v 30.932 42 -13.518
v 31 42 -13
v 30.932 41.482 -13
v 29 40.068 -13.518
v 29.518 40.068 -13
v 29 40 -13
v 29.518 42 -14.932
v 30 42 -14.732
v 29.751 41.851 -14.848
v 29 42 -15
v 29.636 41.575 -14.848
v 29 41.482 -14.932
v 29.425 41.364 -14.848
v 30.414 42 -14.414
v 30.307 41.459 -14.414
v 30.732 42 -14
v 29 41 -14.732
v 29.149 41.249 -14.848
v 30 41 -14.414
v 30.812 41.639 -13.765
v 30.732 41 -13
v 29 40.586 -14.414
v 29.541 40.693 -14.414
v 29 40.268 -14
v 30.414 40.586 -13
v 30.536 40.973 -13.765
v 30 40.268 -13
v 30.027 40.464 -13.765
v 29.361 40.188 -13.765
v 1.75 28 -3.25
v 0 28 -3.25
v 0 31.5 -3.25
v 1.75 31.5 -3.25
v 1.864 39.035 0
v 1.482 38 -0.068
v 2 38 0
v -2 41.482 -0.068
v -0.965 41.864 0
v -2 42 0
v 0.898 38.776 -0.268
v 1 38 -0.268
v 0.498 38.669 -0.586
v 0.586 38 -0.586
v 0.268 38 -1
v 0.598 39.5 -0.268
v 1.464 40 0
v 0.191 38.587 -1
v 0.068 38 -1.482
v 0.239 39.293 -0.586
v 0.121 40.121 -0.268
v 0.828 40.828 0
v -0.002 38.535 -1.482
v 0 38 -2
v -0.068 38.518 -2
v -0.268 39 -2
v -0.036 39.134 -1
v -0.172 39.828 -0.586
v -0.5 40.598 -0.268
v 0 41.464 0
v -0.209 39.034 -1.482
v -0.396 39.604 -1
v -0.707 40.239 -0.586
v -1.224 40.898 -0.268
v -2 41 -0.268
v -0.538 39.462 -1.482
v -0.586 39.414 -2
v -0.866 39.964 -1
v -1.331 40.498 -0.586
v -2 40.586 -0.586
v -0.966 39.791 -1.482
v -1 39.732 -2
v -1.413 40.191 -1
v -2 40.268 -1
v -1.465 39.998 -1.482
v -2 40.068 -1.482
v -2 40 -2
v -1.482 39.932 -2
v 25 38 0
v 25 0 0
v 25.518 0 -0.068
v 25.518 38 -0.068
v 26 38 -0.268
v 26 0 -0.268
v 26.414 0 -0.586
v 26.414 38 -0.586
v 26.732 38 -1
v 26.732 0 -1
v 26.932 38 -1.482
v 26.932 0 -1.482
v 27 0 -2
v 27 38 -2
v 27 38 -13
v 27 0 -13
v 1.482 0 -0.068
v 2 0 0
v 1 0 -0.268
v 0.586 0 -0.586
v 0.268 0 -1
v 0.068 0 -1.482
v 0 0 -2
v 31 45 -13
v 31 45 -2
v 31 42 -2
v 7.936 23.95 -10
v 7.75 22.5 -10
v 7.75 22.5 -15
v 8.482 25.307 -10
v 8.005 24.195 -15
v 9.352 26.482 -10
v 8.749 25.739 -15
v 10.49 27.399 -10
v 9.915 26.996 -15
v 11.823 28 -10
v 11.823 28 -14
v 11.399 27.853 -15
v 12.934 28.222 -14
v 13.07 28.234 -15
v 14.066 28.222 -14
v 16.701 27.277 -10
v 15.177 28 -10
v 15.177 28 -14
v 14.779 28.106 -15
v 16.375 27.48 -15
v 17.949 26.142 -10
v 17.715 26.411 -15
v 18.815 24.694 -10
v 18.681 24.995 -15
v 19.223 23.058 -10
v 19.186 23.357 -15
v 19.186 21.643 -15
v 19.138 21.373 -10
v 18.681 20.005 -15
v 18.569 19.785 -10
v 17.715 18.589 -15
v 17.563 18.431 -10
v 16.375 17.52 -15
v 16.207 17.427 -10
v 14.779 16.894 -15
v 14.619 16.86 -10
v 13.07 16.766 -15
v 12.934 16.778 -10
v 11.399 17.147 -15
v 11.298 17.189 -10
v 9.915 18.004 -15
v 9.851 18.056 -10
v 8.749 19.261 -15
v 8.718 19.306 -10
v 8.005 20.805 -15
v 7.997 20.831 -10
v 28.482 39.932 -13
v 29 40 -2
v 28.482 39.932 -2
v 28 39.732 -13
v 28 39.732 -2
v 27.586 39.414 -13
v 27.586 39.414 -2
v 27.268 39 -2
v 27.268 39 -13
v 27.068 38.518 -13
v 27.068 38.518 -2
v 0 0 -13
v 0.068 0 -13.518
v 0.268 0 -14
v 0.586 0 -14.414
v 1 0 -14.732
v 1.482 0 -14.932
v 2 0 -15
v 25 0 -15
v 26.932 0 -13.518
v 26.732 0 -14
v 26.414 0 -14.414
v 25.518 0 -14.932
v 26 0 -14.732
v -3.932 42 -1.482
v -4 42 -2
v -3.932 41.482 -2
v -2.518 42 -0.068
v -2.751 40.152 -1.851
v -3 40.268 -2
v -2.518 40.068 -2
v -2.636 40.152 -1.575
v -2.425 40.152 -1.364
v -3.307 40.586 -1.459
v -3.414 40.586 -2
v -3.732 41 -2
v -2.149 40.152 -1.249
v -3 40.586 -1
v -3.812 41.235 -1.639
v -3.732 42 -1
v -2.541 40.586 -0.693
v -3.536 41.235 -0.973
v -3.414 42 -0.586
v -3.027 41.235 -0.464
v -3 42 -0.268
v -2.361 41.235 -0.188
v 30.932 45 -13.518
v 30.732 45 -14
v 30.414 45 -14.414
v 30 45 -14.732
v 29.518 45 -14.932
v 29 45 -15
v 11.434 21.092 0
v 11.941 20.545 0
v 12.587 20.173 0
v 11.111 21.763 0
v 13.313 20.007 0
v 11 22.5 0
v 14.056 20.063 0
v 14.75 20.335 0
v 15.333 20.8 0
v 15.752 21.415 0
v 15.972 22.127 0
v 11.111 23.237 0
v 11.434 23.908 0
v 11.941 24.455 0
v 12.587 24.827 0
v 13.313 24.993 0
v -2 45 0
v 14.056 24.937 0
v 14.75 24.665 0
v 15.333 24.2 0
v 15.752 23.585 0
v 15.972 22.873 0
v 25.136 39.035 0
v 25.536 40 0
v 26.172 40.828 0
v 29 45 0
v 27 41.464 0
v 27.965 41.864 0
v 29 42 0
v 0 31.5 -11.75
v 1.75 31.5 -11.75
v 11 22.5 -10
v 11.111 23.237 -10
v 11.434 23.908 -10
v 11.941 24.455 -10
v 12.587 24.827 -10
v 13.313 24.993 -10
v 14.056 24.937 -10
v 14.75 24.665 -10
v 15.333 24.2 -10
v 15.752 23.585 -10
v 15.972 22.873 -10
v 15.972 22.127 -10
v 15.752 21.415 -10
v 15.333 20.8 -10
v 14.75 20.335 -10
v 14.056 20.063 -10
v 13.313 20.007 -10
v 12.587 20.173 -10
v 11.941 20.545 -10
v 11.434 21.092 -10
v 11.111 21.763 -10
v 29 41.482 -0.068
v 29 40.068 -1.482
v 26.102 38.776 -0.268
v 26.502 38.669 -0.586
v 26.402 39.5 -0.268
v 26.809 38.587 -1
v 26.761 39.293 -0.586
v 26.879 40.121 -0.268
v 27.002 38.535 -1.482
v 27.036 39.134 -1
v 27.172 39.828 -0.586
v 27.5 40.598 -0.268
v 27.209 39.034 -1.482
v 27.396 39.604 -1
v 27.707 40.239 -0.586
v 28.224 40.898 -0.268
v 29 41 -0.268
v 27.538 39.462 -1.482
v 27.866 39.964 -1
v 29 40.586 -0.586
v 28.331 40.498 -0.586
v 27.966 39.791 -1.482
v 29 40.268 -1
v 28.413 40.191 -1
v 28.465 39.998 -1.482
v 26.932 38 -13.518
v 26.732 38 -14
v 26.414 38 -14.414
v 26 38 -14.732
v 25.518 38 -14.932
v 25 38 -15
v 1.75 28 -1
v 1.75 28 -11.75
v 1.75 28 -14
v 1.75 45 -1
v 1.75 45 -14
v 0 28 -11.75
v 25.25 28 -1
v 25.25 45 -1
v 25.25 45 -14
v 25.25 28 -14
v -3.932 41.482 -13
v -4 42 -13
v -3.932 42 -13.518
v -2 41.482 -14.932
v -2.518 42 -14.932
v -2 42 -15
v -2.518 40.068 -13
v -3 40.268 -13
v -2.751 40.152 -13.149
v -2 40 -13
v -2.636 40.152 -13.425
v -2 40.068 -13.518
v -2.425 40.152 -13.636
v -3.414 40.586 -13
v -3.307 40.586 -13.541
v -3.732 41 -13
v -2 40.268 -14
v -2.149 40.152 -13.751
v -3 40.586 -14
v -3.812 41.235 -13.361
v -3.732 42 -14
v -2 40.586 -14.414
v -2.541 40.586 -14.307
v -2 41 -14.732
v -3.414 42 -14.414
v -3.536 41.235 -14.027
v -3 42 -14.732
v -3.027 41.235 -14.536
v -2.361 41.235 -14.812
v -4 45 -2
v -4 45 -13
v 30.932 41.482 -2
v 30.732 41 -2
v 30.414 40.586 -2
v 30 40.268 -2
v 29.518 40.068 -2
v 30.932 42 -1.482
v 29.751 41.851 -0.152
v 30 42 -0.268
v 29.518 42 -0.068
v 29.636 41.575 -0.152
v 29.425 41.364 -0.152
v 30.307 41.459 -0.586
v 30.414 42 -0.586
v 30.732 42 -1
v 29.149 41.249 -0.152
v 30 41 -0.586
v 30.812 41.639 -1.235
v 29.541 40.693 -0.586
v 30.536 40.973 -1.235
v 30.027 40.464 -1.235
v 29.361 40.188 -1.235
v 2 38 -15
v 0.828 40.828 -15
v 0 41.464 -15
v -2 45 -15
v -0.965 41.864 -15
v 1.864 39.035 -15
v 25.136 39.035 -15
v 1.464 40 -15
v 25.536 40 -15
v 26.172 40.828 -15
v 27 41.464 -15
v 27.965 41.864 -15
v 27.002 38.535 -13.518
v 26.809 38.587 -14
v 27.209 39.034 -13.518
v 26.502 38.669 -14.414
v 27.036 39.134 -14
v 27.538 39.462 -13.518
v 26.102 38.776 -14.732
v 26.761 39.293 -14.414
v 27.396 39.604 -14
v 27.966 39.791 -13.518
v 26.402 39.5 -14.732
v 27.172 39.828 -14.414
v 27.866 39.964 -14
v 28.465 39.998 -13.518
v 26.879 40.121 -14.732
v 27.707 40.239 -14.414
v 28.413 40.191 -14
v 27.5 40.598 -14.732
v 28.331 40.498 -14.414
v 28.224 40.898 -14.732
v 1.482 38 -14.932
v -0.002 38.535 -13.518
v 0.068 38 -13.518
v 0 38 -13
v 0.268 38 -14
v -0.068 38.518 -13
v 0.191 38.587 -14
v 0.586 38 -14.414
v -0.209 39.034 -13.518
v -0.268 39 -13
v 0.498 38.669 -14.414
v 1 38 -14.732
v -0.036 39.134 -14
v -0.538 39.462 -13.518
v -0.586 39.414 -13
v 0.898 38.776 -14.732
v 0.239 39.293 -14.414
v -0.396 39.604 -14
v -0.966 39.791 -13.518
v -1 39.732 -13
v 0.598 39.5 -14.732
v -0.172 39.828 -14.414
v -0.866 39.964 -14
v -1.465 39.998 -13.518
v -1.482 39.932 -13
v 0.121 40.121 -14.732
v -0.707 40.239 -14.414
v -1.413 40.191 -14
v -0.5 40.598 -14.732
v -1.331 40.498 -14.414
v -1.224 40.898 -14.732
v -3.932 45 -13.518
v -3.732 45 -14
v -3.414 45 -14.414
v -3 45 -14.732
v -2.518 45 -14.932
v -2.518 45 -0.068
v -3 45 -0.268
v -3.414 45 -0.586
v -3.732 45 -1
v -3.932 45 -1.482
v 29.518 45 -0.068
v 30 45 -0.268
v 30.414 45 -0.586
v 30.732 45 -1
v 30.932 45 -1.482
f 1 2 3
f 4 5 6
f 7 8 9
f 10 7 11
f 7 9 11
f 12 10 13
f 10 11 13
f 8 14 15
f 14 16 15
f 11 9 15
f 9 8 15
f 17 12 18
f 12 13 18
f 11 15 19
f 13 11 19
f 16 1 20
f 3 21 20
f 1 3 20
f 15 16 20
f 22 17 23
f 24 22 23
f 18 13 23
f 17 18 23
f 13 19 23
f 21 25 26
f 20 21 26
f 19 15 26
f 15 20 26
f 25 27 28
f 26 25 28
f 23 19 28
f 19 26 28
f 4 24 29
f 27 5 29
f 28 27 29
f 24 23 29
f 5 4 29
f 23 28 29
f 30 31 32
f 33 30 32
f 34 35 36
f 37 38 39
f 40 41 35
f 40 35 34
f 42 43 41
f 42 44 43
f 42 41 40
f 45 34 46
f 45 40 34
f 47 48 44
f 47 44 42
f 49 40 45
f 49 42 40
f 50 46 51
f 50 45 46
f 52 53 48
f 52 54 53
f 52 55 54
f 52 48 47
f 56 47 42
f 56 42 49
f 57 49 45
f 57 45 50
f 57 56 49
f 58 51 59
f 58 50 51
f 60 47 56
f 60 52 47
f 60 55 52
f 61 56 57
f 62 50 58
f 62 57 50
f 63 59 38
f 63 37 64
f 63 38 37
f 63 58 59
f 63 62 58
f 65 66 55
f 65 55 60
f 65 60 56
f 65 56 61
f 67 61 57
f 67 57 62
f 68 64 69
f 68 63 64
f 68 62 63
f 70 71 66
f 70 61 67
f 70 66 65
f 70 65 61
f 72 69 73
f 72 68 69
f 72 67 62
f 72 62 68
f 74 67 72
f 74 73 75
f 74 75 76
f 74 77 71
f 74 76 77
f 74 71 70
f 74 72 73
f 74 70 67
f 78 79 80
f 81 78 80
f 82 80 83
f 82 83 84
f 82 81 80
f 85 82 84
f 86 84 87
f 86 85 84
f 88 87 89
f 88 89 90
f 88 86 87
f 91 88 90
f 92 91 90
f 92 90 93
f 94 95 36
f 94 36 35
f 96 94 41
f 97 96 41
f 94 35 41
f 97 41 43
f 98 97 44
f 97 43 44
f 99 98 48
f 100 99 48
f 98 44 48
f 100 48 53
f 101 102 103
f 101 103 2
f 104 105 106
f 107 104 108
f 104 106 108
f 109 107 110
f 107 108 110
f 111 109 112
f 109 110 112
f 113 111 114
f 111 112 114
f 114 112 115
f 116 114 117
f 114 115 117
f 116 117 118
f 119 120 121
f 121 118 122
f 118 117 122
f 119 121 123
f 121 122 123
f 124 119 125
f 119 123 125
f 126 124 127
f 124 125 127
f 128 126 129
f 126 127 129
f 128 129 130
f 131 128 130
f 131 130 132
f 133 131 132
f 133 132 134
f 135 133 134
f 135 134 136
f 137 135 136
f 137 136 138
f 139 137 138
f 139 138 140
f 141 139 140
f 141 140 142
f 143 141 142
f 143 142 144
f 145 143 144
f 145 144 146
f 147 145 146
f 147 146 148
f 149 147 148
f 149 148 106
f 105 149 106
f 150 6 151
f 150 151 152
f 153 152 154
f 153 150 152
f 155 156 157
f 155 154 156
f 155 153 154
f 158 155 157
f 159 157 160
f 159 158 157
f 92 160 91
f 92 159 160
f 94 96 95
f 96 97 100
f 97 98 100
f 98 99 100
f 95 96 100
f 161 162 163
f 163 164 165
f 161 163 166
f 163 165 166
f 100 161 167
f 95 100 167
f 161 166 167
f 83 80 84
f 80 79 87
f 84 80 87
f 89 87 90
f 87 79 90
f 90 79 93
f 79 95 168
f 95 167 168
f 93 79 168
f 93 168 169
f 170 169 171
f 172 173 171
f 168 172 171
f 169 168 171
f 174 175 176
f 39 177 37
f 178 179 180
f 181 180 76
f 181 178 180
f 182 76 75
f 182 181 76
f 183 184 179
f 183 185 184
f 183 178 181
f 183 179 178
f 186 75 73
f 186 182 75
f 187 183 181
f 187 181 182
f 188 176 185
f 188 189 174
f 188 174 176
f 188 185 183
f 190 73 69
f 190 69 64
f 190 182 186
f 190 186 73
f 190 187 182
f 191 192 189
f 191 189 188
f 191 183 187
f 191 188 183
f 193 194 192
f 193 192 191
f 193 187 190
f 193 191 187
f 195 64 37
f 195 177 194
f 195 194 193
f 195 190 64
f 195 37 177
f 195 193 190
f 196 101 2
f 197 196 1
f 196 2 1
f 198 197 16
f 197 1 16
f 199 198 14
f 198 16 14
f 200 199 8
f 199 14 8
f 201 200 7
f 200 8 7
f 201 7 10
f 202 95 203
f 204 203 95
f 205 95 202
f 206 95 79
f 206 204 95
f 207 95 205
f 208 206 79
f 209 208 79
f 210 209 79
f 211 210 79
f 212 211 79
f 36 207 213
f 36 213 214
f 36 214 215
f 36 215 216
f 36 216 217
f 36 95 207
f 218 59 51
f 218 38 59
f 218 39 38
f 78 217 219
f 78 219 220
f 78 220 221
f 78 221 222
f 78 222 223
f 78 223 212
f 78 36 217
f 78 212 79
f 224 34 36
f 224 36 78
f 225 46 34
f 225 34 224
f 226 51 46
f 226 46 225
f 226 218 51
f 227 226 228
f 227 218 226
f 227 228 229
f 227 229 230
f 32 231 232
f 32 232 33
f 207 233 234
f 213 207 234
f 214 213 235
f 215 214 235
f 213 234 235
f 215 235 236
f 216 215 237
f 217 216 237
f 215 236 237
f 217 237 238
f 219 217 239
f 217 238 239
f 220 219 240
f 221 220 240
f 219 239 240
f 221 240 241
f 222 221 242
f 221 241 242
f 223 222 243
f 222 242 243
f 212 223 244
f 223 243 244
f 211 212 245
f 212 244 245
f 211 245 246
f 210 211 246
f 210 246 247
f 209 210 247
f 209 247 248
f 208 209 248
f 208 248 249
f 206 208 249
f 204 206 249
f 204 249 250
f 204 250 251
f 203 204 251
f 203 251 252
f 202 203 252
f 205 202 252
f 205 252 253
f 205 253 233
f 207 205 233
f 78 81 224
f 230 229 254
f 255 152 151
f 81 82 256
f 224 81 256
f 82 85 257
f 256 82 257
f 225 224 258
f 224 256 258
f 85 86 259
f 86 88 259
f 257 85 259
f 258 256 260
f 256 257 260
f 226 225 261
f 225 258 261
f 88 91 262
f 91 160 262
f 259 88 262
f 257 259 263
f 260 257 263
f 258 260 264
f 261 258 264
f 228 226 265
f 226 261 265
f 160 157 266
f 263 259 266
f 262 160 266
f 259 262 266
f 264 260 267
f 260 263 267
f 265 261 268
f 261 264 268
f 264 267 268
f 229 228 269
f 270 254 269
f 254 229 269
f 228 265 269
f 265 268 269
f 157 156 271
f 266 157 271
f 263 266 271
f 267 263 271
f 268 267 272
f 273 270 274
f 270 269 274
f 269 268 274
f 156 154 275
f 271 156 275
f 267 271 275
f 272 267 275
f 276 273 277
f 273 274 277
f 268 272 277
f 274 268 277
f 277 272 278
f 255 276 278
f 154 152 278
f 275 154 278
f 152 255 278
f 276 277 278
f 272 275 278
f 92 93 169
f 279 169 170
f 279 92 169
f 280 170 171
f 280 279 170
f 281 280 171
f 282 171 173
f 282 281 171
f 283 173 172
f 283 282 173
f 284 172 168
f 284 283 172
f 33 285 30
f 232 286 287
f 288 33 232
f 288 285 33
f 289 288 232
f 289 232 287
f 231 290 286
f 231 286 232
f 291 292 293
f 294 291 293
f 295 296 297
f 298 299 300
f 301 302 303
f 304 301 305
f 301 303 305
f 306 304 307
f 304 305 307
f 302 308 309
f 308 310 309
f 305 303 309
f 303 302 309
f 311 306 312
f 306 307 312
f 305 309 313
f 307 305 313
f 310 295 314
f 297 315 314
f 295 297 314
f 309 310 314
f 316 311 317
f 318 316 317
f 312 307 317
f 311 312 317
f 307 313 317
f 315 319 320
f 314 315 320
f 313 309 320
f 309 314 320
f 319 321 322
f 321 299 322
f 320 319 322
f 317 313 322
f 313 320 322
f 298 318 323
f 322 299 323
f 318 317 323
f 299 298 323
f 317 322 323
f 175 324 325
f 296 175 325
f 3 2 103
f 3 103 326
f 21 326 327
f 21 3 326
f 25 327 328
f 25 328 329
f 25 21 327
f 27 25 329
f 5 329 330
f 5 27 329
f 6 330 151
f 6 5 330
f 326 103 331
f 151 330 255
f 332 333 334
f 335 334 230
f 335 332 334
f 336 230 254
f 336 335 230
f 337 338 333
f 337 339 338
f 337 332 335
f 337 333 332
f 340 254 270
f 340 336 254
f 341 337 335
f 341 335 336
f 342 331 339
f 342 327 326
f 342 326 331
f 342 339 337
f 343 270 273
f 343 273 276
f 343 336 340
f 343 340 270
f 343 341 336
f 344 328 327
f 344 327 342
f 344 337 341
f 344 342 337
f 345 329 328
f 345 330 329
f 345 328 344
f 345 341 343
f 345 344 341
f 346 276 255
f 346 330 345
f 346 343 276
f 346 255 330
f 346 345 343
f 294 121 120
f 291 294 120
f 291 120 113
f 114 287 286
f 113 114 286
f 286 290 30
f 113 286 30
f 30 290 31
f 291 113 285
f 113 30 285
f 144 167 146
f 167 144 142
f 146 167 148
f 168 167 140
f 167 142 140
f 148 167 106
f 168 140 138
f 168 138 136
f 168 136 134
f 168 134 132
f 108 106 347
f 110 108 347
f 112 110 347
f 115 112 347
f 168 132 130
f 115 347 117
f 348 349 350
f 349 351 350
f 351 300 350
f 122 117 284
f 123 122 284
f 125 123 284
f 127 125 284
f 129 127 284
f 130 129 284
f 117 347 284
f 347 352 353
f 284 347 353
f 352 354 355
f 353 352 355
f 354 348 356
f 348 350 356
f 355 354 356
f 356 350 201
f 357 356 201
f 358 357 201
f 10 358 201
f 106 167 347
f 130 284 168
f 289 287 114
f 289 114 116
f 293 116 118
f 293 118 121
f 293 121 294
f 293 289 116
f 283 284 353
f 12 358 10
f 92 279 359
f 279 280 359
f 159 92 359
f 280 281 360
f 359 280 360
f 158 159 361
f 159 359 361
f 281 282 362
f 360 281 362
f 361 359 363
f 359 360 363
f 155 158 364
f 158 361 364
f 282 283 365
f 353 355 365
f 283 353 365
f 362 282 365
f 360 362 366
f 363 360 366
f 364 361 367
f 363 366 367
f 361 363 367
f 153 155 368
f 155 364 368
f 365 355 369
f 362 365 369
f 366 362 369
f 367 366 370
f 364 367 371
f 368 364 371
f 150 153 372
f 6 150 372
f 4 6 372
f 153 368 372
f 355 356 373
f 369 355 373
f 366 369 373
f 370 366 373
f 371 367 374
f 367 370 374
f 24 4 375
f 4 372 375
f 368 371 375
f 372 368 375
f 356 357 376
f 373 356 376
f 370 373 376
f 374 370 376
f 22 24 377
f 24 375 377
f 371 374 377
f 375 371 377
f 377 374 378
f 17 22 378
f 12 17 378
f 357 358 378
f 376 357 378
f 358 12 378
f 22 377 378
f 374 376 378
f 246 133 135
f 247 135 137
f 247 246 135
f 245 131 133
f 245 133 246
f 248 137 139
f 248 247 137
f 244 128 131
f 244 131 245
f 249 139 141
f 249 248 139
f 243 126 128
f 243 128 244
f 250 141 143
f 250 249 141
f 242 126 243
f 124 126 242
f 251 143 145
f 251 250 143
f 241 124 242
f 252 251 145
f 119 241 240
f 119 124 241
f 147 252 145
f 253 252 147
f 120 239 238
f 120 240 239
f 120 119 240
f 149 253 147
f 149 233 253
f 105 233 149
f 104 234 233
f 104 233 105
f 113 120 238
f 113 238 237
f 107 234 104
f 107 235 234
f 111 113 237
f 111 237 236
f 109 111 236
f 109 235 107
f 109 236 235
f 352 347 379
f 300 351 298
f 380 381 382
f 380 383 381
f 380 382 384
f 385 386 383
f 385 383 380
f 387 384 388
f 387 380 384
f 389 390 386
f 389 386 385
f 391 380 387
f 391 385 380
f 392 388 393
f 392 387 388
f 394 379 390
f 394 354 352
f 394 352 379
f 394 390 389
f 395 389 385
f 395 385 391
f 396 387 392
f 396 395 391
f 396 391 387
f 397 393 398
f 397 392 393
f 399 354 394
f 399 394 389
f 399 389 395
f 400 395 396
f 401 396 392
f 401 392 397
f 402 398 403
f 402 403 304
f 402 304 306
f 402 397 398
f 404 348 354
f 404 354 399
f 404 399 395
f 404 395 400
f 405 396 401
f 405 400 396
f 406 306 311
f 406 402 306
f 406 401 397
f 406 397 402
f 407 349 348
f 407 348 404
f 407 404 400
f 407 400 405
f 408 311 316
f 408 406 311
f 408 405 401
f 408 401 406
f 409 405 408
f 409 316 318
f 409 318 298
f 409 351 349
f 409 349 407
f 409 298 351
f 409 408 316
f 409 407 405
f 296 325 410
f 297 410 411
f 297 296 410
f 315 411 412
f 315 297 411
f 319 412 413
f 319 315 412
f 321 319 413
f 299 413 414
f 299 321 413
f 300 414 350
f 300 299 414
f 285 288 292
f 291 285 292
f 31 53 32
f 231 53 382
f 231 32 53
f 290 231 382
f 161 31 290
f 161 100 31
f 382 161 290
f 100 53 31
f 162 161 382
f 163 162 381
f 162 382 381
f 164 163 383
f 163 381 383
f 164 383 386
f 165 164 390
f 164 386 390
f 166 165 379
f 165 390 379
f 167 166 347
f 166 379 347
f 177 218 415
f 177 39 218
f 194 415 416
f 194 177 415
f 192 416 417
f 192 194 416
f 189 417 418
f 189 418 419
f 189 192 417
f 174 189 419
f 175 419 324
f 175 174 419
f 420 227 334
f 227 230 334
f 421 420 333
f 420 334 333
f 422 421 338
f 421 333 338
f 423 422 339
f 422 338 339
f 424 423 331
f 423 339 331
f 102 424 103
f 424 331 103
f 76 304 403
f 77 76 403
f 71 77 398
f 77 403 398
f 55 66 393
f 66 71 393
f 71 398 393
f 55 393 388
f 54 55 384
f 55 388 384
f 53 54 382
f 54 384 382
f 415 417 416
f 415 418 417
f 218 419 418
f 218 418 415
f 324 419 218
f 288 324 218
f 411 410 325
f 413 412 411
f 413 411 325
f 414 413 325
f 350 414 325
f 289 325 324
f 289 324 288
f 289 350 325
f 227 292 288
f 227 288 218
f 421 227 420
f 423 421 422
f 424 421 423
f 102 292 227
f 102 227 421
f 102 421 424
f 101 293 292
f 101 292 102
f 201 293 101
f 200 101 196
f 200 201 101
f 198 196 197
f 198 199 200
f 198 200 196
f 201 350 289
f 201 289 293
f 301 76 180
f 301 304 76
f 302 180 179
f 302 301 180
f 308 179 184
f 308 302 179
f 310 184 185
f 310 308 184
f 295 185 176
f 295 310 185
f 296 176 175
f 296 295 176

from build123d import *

# Parameters (mm, degrees)
SKETCH1_W           = 27
SKETCH1_H           = 15
BOSS_EXTRUDE1_DEPTH = 45
SKETCH2_W           = 35
SKETCH2_H           = 15
BOSS_EXTRUDE2_DEPTH = 5
SKETCH3_W           = 23.5
SKETCH3_H           = 13
CUT_EXTRUDE1_DEPTH  = 17
SKETCH4_W           = 8.5
SKETCH4_H           = 3.5
CUT_EXTRUDE2_DEPTH  = 17
SKETCH5_R           = 2.5
CUT_EXTRUDE3_DEPTH  = 17
FILLET1_R           = 2
SKETCH6_R           = 5.75
CUT_EXTRUDE4_DEPTH  = 5


with BuildPart() as part:
    # Sketch1 → Boss-Extrude1 (new body)
    with BuildSketch(Plane(origin=(0, 0, 0), x_dir=(1, 0, 0), z_dir=(0, 1, 0))):
        with Locations((13.5, 7.5)):
            Rectangle(SKETCH1_W, SKETCH1_H)
    extrude(amount=BOSS_EXTRUDE1_DEPTH)

    # Sketch2 → Boss-Extrude2 (add)
    with BuildSketch(Plane(origin=(0, 45, 0), x_dir=(1, 0, 0), z_dir=(0, 1, 0))):
        with Locations((13.5, 7.5)):
            Rectangle(SKETCH2_W, SKETCH2_H)
    extrude(amount=-BOSS_EXTRUDE2_DEPTH)

    # Sketch3 → Cut-Extrude1 (cut)
    with BuildSketch(Plane(origin=(0, 45, 0), x_dir=(1, 0, 0), z_dir=(0, 1, 0))):
        with Locations((13.5, 7.5)):
            Rectangle(SKETCH3_W, SKETCH3_H)
    extrude(amount=-CUT_EXTRUDE1_DEPTH, mode=Mode.SUBTRACT)

    # Sketch4 → Cut-Extrude2 (cut)
    with BuildSketch(Plane.ZY):
        with Locations((-7.5, 29.75)):
            Rectangle(SKETCH4_W, SKETCH4_H)
    extrude(amount=-CUT_EXTRUDE2_DEPTH, mode=Mode.SUBTRACT)

    # Sketch5 → Cut-Extrude3 (cut)
    with BuildSketch(Plane(origin=(0, 0, -15), x_dir=(-1, 0, 0), z_dir=(0, 0, -1))):
        with Locations((-13.5, 22.5)):
            Circle(SKETCH5_R)
    extrude(amount=-CUT_EXTRUDE3_DEPTH, mode=Mode.SUBTRACT)

    # Fillet1
    fillet1_edges = [part.edges().sort_by_distance(p)[0] for p in [
        (0, 40, -7.5),
        (27, 40, -7.5),
    ]]
    fillet(fillet1_edges, radius=FILLET1_R)
    fillet1_2_edges = [part.edges().sort_by_distance(p)[0] for p in [
        (-4, 42.5, -15),
        (-4, 42.5, 0),
        (-4, 40, -7.5),
        (31, 40, -7.5),
        (31, 42.5, 0),
        (31, 42.5, -15),
        (0, 19, -15),
        (0, 19, 0),
        (27, 19, 0),
        (27, 19, -15),
        (27.585786438, 39.414213562, -15),
        (27.585786438, 39.414213562, 0),
        (-0.585786438, 39.414213562, 0),
        (-0.585786438, 39.414213562, -15),
    ]]
    fillet(fillet1_2_edges, radius=FILLET1_R - 0.0001)  # a hair under: the kernel refuses the full size

    # Sketch6 → Cut-Extrude4 (cut)
    with BuildSketch(Plane(origin=(0, 0, -15), x_dir=(-1, 0, 0), z_dir=(0, 0, -1))):
        with Locations((-13.5, 22.5)):
            Circle(SKETCH6_R)
    extrude(amount=-CUT_EXTRUDE4_DEPTH, mode=Mode.SUBTRACT)


solid = part.part
